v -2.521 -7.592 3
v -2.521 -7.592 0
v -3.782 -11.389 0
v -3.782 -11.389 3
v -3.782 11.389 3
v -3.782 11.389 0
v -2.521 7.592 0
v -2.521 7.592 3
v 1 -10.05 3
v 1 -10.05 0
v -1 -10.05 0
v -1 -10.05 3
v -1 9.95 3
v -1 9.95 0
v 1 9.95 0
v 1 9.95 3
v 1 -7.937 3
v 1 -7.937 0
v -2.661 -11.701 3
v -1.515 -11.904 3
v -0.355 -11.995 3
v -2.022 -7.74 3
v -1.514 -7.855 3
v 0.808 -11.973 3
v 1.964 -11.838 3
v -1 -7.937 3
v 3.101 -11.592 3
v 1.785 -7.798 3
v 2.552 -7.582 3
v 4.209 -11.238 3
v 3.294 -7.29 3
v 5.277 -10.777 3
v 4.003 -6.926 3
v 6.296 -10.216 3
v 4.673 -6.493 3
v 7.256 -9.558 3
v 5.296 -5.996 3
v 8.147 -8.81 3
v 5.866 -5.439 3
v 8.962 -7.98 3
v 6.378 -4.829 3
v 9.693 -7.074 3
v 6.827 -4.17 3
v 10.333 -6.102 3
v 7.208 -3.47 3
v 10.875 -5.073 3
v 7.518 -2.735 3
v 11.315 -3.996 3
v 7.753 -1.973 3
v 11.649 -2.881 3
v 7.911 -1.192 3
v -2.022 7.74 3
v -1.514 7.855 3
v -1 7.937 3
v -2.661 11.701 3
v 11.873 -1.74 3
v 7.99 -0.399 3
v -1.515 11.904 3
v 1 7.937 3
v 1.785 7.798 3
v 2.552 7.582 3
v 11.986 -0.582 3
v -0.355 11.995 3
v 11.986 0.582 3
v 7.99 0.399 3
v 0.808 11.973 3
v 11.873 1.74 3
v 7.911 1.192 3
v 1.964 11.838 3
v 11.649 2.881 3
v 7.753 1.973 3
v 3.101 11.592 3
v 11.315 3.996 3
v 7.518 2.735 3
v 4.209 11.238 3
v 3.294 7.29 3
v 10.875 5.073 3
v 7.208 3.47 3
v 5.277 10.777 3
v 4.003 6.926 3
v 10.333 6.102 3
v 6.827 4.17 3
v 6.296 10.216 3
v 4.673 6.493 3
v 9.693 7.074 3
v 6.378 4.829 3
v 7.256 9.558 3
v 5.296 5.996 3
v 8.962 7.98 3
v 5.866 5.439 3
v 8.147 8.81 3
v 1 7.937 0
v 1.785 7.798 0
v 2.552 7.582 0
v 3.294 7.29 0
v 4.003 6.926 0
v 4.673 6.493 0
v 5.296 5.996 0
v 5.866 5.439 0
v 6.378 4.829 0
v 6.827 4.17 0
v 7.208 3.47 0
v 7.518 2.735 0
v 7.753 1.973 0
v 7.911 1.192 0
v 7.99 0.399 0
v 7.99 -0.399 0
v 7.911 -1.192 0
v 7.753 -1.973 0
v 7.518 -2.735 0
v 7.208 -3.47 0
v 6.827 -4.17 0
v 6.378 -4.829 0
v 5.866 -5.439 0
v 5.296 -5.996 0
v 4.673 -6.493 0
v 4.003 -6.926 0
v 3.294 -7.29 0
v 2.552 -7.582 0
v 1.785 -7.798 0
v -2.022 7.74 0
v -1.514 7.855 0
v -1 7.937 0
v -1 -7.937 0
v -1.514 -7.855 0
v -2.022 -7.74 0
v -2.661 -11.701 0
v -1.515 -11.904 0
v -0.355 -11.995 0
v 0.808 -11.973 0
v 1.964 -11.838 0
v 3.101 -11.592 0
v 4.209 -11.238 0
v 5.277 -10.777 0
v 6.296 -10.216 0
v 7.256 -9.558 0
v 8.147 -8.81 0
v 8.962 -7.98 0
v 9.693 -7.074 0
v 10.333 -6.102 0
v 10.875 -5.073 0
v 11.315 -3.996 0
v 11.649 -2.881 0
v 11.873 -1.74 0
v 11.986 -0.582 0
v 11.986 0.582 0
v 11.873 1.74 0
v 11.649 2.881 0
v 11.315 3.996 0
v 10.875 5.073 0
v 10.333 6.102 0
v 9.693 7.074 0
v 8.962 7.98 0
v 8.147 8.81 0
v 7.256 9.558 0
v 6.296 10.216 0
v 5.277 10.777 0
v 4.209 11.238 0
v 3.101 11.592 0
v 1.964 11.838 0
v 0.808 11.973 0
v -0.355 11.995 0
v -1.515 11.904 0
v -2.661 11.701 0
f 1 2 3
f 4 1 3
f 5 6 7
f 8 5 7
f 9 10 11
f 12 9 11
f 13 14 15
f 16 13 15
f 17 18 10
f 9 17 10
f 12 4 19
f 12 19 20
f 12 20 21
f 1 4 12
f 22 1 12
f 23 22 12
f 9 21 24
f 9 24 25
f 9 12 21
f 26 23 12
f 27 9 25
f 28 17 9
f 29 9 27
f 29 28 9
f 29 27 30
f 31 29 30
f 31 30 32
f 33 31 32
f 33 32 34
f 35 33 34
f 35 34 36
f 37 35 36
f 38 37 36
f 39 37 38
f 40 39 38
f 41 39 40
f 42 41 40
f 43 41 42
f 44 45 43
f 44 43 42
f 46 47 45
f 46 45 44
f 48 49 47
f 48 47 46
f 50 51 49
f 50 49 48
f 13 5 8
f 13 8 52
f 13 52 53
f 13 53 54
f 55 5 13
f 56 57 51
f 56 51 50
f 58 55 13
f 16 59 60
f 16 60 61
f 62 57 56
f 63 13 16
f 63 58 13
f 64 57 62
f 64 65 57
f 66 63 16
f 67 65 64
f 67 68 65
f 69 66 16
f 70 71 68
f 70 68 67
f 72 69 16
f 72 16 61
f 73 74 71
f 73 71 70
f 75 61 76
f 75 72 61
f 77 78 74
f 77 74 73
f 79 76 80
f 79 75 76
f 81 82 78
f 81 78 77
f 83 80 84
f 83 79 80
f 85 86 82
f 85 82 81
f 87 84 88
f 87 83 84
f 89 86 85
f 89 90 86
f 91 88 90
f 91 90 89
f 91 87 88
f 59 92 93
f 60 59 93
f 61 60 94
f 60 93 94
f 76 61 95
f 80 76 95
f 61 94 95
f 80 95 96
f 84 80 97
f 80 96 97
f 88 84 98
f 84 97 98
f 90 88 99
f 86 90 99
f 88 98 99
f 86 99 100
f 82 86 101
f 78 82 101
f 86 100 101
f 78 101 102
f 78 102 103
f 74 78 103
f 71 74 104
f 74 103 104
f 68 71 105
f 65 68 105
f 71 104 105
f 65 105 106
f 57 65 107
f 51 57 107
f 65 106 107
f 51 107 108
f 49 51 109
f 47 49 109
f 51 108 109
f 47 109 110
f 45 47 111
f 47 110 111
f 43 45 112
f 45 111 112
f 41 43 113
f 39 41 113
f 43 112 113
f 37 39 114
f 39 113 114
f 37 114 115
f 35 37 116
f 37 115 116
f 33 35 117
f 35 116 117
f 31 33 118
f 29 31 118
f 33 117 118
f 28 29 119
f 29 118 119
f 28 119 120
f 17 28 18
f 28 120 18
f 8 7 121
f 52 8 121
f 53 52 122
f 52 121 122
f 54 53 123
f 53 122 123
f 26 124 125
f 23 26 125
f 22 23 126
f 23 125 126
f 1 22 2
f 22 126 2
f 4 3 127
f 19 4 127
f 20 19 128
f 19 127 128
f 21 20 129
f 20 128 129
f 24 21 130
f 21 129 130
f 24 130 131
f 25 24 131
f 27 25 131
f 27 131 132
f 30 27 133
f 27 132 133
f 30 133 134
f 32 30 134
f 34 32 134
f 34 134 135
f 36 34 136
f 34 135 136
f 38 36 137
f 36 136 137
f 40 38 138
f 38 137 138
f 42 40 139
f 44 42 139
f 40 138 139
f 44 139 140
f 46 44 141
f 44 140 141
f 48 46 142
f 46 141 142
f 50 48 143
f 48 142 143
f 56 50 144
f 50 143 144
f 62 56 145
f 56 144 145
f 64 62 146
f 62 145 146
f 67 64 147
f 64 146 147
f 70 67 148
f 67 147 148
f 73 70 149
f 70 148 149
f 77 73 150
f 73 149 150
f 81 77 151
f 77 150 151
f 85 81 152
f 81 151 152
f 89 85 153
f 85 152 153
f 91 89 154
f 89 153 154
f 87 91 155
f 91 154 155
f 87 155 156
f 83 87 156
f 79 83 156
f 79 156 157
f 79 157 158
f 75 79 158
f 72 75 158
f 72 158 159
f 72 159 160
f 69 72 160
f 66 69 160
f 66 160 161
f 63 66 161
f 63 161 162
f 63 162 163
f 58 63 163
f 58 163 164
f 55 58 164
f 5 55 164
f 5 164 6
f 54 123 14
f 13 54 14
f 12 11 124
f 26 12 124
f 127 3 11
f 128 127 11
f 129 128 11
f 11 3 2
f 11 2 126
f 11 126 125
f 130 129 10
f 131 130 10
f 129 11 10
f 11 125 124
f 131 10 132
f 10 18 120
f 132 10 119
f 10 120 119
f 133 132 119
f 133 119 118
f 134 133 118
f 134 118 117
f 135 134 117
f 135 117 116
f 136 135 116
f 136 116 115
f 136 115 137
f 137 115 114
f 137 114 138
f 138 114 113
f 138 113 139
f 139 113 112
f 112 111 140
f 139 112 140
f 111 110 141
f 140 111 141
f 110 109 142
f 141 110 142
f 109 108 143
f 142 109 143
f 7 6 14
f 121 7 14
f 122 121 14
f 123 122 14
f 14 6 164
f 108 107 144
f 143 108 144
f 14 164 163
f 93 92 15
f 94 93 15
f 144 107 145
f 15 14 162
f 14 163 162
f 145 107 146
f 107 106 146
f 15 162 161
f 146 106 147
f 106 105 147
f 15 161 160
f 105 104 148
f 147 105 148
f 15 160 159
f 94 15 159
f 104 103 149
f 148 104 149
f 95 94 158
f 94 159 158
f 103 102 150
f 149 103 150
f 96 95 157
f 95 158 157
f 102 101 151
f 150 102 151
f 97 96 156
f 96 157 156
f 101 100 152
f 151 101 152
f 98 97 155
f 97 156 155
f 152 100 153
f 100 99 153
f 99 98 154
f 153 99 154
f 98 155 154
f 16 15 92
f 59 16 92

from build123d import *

# Parameters (mm, degrees)
BOSS_EXTRUDE1_DEPTH = 3


with BuildPart() as part:
    # Sketch2 → Boss-Extrude1 (new body)
    with BuildSketch(Plane.XY):
        with BuildLine():
            Line((-3.781717443, 11.388529895), (-2.521144962, 7.592353264))
            ThreePointArc((-2.521144962, 7.592353264), (-1.768998185, 7.801964203), (-1, 7.937253933))
            Line((-1, 7.937253933), (-1, 8.94427191))
            Line((-1, 8.94427191), (-1, 9.949874371))
            Line((-1, 9.949874371), (1, 9.949874371))
            Line((1, 9.949874371), (1, 8.94427191))
            Line((1, 8.94427191), (1, 7.937253933))
            ThreePointArc((1, 7.937253933), (8, 0), (1, -7.937253933))
            Line((1, -7.937253933), (1, -8.94427191))
            Line((1, -8.94427191), (1, -10.050125629))
            Line((1, -10.050125629), (-1, -10.050125629))
            Line((-1, -10.050125629), (-1, -8.94427191))
            Line((-1, -8.94427191), (-1, -7.937253933))
            ThreePointArc((-1, -7.937253933), (-1.768998185, -7.801964203), (-2.521144962, -7.592353264))
            Line((-2.521144962, -7.592353264), (-3.781717443, -11.388529895))
            ThreePointArc((-3.781717443, -11.388529895), (12, 0), (-3.781717443, 11.388529895))
        make_face()
    extrude(amount=BOSS_EXTRUDE1_DEPTH)


solid = part.part
